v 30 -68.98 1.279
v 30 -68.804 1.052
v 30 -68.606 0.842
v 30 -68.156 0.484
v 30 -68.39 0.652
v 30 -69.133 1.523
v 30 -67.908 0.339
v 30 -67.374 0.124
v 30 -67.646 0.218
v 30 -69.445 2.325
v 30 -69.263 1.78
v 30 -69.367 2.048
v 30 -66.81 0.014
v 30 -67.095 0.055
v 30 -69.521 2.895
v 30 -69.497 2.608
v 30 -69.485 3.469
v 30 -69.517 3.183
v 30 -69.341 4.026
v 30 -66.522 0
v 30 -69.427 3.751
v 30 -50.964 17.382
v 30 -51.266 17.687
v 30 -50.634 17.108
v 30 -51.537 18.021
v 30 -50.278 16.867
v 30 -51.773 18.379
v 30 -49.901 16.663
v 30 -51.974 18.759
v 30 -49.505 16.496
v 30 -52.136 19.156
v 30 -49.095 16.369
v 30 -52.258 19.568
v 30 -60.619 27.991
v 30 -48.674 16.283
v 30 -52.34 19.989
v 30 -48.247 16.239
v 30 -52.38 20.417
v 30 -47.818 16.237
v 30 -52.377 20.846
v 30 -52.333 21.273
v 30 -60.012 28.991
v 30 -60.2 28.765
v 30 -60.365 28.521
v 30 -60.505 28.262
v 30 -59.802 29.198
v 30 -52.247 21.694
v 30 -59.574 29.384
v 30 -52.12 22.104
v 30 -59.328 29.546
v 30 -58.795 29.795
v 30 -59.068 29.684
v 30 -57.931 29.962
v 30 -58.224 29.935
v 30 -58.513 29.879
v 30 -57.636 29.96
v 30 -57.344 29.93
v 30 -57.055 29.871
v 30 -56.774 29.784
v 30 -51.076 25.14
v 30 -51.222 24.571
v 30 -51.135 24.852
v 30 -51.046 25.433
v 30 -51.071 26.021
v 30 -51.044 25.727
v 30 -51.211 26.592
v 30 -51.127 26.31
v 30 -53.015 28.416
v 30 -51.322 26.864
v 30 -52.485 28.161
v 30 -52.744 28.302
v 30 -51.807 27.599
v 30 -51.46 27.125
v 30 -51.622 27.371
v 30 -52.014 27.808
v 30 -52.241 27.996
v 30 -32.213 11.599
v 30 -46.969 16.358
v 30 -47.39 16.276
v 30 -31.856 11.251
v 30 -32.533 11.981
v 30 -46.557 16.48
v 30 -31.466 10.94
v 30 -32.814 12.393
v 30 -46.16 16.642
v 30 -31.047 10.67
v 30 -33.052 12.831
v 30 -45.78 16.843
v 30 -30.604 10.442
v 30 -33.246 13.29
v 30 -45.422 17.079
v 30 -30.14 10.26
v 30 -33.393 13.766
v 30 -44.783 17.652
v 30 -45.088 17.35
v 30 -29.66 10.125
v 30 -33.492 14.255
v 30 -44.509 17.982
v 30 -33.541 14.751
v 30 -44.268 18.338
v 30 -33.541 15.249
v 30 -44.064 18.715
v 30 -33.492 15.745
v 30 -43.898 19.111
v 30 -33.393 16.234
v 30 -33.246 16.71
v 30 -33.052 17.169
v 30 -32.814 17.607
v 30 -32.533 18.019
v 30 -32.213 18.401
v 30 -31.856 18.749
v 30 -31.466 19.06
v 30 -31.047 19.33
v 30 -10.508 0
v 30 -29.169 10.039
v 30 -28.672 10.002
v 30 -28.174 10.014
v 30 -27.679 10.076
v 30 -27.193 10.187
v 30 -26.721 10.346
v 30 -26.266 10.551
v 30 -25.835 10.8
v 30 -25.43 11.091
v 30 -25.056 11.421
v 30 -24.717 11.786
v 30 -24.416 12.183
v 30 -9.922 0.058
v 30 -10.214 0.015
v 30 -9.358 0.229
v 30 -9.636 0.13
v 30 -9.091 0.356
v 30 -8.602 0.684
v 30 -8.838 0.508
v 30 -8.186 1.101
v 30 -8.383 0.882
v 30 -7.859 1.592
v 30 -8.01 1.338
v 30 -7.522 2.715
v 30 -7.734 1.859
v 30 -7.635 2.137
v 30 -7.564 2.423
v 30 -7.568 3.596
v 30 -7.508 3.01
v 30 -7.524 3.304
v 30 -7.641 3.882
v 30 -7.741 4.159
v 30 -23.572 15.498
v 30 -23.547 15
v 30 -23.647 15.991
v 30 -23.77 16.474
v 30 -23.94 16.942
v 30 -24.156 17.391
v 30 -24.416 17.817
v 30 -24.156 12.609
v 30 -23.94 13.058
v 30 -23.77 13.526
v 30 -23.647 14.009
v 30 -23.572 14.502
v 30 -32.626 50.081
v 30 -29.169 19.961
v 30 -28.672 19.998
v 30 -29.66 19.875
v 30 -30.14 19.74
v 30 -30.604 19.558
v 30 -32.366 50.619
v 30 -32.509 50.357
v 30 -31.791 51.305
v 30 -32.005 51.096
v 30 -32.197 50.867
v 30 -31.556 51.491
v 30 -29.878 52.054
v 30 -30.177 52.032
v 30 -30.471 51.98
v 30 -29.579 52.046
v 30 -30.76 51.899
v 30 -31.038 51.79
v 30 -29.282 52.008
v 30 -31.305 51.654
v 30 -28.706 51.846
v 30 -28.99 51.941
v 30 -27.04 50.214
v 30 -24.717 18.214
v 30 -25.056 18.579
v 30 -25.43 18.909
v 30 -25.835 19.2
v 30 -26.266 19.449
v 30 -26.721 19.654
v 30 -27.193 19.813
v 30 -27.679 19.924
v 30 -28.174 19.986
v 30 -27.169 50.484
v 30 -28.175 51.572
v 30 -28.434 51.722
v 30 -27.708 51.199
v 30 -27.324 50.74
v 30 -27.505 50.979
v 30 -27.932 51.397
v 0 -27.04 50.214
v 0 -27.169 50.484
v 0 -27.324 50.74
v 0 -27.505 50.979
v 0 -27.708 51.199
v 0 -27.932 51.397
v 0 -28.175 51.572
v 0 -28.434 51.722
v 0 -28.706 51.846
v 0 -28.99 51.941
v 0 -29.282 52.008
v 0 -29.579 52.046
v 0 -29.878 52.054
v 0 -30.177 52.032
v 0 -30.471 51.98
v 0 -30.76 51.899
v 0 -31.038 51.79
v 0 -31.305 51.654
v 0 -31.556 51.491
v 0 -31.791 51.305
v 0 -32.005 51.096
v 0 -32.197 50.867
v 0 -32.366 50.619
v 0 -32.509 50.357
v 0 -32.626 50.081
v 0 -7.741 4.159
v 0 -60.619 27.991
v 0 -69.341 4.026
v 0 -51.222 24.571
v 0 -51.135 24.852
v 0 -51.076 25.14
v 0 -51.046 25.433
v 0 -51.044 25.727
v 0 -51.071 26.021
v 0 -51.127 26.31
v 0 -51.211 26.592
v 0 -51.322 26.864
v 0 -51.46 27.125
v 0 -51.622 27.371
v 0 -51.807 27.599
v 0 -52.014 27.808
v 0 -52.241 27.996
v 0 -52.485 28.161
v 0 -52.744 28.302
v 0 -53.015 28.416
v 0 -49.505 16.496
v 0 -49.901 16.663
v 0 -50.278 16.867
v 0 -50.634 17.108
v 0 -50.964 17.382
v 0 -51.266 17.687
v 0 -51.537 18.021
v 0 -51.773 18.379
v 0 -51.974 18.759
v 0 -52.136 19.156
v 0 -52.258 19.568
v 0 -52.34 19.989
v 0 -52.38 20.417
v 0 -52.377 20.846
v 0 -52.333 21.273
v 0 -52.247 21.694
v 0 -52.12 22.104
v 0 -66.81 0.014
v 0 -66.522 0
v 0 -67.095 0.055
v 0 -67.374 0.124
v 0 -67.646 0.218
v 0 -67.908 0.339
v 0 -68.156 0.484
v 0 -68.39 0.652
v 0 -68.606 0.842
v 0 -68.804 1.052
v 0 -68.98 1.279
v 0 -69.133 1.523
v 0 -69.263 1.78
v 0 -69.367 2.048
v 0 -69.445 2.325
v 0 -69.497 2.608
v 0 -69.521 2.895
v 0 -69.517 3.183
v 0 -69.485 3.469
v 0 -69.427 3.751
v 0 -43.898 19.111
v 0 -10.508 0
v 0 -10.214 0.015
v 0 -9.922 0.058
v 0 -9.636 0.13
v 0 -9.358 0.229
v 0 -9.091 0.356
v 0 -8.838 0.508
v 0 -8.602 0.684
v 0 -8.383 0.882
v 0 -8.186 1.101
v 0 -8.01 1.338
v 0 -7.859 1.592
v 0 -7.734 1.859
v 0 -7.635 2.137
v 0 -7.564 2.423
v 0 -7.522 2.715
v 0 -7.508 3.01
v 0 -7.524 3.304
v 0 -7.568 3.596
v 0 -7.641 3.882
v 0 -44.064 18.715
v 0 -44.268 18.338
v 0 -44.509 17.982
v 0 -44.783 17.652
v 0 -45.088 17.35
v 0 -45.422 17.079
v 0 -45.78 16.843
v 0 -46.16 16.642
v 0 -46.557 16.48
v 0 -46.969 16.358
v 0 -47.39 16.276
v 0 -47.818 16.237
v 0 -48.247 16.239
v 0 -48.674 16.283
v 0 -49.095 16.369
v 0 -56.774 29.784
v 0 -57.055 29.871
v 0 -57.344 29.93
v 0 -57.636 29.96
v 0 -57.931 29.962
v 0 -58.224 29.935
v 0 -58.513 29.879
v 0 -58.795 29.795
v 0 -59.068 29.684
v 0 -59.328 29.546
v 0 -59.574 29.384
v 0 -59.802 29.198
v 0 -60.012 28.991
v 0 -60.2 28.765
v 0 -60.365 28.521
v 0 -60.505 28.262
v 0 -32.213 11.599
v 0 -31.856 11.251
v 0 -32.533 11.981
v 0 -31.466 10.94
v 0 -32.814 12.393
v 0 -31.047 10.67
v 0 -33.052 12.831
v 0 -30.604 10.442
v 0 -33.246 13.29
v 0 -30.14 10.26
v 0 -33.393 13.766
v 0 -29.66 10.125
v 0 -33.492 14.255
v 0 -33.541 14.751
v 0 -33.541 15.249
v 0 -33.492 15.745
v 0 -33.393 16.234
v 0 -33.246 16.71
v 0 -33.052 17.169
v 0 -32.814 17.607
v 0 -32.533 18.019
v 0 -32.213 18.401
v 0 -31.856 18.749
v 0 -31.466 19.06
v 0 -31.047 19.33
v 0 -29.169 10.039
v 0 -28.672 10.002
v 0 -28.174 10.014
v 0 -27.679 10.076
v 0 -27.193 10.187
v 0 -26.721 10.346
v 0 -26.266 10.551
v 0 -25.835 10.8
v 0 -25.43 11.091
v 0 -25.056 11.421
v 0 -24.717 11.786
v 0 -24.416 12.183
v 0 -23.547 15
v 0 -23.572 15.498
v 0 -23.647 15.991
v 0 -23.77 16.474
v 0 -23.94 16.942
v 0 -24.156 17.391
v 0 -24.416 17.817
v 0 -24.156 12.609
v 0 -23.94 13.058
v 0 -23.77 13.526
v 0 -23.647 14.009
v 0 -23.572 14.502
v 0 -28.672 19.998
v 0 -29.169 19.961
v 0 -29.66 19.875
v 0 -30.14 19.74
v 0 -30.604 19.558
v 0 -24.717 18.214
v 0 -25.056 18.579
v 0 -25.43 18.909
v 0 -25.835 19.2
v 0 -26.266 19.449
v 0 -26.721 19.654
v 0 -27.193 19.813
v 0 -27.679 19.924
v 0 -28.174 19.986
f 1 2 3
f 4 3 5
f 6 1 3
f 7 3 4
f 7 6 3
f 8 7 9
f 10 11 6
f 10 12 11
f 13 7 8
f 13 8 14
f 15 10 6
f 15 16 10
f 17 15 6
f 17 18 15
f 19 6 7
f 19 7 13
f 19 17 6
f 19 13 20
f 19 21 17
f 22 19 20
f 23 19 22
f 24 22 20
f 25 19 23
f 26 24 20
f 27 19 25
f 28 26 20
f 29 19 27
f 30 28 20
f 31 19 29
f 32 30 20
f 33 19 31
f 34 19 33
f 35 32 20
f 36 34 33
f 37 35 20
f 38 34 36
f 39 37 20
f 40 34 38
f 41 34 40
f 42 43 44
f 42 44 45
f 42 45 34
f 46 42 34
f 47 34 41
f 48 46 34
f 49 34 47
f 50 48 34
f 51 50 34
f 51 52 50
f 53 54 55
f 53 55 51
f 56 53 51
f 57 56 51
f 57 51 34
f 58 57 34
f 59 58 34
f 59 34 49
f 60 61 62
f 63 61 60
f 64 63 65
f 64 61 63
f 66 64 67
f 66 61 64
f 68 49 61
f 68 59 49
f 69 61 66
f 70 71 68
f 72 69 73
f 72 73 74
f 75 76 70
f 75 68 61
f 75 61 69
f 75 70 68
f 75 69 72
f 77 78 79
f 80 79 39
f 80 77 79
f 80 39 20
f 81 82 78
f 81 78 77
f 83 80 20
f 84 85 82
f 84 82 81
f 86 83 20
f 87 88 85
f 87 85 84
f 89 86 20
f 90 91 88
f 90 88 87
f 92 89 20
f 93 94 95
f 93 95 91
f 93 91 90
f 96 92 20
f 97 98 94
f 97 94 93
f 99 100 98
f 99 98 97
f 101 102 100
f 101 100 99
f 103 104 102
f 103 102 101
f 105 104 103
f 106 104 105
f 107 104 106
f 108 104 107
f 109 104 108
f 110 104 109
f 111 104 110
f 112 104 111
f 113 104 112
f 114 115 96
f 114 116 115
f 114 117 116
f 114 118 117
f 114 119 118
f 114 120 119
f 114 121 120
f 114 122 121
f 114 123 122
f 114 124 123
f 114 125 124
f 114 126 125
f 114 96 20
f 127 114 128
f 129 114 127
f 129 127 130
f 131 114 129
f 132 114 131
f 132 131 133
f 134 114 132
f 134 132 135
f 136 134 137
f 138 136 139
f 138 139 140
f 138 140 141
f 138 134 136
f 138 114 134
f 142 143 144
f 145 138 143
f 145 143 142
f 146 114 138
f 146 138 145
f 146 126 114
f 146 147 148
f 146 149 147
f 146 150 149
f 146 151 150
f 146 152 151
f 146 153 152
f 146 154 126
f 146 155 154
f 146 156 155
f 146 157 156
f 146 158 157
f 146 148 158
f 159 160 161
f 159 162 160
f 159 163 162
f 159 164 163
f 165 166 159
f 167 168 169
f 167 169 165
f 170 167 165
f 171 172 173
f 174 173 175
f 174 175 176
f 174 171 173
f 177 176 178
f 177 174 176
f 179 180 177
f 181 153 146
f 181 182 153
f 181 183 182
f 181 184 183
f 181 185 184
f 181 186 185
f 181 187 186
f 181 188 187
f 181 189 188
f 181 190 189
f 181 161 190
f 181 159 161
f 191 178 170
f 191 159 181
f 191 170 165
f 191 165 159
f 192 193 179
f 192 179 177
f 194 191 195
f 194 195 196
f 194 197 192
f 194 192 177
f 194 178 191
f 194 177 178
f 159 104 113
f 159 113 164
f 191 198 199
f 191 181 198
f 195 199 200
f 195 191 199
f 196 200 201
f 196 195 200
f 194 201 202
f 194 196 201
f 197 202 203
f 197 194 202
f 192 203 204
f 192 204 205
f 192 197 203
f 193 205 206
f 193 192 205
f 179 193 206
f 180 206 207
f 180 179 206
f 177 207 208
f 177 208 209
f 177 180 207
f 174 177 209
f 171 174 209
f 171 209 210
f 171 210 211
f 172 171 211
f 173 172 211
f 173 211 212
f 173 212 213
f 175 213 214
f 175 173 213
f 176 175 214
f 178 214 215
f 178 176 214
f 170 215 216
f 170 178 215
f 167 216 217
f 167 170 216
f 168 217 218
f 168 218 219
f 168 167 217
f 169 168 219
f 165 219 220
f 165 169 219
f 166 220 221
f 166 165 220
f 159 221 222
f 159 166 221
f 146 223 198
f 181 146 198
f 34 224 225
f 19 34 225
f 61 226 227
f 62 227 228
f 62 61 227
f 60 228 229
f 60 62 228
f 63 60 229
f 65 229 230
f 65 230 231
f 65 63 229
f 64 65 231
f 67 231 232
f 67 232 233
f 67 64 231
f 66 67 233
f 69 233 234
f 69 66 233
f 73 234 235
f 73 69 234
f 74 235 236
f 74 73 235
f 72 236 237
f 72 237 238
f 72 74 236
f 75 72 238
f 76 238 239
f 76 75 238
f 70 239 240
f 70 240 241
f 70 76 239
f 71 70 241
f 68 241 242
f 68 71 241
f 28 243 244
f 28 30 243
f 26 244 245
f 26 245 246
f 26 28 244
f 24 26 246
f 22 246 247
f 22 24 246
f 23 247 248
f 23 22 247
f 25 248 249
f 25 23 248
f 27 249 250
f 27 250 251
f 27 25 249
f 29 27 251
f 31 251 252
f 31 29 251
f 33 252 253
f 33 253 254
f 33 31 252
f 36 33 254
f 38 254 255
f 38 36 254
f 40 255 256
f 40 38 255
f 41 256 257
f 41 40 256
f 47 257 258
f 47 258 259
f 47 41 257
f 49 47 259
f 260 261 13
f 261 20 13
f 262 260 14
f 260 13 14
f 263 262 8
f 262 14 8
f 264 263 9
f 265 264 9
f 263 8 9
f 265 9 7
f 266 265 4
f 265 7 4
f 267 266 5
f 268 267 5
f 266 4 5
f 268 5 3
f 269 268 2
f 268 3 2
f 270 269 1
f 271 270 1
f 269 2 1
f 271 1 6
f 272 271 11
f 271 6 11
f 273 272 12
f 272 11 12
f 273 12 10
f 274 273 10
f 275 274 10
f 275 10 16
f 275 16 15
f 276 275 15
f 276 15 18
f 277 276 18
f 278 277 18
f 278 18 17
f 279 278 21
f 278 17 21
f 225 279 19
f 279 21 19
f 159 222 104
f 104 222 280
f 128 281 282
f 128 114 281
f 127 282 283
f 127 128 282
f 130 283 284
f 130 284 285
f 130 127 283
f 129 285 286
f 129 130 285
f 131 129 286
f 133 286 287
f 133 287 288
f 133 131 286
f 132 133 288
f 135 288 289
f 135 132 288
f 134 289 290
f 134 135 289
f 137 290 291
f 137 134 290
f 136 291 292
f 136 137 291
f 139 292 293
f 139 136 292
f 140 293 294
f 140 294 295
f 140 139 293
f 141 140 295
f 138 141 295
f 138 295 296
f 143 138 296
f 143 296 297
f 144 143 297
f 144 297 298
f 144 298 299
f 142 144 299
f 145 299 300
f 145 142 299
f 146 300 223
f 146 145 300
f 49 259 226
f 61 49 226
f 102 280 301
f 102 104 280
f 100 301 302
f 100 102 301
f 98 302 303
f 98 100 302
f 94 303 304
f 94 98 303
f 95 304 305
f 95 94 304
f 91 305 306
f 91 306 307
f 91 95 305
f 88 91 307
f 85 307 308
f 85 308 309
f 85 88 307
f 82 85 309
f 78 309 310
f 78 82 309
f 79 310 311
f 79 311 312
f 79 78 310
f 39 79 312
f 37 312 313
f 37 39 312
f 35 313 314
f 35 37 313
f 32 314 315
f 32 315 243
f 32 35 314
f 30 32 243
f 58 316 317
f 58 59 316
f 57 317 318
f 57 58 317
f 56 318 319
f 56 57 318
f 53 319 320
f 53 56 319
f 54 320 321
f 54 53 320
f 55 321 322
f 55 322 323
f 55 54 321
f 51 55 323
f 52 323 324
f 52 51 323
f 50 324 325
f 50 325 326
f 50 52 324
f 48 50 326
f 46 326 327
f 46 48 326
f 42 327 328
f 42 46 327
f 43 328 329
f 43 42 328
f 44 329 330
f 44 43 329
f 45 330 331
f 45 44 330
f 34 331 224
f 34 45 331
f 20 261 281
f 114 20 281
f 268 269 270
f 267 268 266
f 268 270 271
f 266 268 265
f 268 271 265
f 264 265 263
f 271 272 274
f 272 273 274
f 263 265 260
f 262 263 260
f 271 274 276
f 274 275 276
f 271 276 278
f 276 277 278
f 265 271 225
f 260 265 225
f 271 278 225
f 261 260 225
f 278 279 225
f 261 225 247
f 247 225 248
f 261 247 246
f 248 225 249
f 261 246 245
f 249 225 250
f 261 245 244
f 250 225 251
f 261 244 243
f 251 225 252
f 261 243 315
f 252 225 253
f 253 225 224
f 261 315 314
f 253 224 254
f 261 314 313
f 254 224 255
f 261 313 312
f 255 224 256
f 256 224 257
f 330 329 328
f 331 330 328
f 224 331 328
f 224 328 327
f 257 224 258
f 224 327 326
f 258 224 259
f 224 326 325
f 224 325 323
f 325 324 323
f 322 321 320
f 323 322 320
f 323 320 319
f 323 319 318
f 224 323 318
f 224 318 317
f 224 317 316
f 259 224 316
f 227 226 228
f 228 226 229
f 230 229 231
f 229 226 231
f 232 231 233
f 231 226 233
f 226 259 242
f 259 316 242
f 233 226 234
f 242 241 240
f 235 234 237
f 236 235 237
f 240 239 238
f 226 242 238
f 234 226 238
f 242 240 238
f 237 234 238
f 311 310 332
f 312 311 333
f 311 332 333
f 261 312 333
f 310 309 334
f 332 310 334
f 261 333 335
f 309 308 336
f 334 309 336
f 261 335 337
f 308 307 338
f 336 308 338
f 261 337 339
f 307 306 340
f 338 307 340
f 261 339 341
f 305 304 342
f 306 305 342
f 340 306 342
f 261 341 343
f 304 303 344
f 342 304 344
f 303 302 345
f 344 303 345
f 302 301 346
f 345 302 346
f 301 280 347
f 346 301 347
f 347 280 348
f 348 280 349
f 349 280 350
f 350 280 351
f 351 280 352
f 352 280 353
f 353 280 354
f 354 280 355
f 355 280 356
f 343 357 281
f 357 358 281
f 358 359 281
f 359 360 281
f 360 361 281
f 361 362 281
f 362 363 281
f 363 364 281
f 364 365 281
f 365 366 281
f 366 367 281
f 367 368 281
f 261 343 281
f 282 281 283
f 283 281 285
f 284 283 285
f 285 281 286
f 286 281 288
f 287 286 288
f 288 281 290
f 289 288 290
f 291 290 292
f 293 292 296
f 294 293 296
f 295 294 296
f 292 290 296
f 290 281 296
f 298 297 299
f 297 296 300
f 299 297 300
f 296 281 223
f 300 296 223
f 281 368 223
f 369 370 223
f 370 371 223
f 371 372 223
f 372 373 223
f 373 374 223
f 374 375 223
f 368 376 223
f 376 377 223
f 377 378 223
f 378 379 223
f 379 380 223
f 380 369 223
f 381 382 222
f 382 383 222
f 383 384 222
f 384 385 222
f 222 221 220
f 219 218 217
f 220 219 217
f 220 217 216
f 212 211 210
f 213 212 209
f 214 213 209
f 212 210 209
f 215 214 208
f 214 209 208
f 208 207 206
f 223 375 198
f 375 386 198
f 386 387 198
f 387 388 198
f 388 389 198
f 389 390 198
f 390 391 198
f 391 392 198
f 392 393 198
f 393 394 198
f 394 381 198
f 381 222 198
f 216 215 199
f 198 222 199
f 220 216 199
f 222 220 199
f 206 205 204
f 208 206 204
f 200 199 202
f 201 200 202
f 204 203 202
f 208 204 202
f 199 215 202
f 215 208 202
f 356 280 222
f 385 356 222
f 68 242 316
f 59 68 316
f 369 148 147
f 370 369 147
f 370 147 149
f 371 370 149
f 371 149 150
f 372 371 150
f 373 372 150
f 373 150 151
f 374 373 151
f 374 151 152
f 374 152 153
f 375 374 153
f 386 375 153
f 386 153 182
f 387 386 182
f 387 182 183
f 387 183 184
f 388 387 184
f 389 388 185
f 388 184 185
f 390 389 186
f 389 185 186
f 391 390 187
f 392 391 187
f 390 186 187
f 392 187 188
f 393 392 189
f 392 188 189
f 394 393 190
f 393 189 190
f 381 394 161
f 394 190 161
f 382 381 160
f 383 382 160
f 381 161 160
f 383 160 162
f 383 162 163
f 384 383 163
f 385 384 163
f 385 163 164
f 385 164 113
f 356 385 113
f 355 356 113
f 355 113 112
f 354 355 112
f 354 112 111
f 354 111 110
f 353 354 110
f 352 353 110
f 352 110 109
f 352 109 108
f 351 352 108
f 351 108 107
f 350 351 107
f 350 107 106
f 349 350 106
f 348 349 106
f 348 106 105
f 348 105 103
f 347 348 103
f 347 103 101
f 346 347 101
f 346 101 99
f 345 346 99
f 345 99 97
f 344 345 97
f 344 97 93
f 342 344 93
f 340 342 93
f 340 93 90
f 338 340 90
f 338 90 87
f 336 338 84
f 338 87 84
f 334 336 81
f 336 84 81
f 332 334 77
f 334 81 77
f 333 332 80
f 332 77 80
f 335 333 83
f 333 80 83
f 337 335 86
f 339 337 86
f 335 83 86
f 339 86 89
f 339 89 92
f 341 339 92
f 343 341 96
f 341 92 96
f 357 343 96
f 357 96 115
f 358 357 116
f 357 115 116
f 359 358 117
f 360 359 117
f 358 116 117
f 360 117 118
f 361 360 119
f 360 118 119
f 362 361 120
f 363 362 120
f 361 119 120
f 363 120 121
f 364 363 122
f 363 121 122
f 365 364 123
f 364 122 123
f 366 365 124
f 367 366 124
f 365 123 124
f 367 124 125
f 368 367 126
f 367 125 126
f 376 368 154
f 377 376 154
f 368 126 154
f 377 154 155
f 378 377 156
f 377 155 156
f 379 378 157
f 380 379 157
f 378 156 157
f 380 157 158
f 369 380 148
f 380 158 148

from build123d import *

# Parameters (mm, degrees)
F4_DEPTH = 30
F5_R     = 3
F6_R     = 5
F7_DEPTH = 33.1
F8_R     = 4.37499


# Not quite as in the source:
# - a fillet or chamfer is up to 0.001 mm smaller than in the source, because OpenCascade refuses the exact size


with BuildPart() as f4:
    # F3 (on Right) → F4 (new body)
    with BuildSketch(Plane.YZ):
        Polygon((-70.8067866115, 0), (-5.9983764602, 0), (-30.002993414, 57.2861679354), (-45.3938998636, 15), (-53.6162102955, 17.9926762541), (-50.1960088622, 27.389602462), (-59.5929350701, 30.8098038952), align=None)
    extrude(amount=F4_DEPTH)

    # F5
    f5_edges = [f4.edges().sort_by_distance(p)[0] for p in [
        (15, -50.196009, 27.389602),
        (15, -30.002993, 57.286168),
        (15, -59.592935, 30.809804),
        (15, -70.806787, 0),
        (15, -5.998376, 0),
    ]]
    fillet(f5_edges, radius=F5_R)

    # F6 (on face) → F7 (cut)
    with BuildSketch(Plane.YZ.offset(30)):
        with Locations((-28.5474918187, 15)):
            Circle(F6_R)
    extrude(amount=-F7_DEPTH, mode=Mode.SUBTRACT)

    # F8 (radius 4.375 in the source; OpenCascade refuses exactly that, so slightly less here)
    f8_edges = [f4.edges().sort_by_distance(p)[0] for p in [
        (15, -53.61621, 17.992676),
        (15, -45.3939, 15),
    ]]
    fillet(f8_edges, radius=F8_R)


solid = f4.part
